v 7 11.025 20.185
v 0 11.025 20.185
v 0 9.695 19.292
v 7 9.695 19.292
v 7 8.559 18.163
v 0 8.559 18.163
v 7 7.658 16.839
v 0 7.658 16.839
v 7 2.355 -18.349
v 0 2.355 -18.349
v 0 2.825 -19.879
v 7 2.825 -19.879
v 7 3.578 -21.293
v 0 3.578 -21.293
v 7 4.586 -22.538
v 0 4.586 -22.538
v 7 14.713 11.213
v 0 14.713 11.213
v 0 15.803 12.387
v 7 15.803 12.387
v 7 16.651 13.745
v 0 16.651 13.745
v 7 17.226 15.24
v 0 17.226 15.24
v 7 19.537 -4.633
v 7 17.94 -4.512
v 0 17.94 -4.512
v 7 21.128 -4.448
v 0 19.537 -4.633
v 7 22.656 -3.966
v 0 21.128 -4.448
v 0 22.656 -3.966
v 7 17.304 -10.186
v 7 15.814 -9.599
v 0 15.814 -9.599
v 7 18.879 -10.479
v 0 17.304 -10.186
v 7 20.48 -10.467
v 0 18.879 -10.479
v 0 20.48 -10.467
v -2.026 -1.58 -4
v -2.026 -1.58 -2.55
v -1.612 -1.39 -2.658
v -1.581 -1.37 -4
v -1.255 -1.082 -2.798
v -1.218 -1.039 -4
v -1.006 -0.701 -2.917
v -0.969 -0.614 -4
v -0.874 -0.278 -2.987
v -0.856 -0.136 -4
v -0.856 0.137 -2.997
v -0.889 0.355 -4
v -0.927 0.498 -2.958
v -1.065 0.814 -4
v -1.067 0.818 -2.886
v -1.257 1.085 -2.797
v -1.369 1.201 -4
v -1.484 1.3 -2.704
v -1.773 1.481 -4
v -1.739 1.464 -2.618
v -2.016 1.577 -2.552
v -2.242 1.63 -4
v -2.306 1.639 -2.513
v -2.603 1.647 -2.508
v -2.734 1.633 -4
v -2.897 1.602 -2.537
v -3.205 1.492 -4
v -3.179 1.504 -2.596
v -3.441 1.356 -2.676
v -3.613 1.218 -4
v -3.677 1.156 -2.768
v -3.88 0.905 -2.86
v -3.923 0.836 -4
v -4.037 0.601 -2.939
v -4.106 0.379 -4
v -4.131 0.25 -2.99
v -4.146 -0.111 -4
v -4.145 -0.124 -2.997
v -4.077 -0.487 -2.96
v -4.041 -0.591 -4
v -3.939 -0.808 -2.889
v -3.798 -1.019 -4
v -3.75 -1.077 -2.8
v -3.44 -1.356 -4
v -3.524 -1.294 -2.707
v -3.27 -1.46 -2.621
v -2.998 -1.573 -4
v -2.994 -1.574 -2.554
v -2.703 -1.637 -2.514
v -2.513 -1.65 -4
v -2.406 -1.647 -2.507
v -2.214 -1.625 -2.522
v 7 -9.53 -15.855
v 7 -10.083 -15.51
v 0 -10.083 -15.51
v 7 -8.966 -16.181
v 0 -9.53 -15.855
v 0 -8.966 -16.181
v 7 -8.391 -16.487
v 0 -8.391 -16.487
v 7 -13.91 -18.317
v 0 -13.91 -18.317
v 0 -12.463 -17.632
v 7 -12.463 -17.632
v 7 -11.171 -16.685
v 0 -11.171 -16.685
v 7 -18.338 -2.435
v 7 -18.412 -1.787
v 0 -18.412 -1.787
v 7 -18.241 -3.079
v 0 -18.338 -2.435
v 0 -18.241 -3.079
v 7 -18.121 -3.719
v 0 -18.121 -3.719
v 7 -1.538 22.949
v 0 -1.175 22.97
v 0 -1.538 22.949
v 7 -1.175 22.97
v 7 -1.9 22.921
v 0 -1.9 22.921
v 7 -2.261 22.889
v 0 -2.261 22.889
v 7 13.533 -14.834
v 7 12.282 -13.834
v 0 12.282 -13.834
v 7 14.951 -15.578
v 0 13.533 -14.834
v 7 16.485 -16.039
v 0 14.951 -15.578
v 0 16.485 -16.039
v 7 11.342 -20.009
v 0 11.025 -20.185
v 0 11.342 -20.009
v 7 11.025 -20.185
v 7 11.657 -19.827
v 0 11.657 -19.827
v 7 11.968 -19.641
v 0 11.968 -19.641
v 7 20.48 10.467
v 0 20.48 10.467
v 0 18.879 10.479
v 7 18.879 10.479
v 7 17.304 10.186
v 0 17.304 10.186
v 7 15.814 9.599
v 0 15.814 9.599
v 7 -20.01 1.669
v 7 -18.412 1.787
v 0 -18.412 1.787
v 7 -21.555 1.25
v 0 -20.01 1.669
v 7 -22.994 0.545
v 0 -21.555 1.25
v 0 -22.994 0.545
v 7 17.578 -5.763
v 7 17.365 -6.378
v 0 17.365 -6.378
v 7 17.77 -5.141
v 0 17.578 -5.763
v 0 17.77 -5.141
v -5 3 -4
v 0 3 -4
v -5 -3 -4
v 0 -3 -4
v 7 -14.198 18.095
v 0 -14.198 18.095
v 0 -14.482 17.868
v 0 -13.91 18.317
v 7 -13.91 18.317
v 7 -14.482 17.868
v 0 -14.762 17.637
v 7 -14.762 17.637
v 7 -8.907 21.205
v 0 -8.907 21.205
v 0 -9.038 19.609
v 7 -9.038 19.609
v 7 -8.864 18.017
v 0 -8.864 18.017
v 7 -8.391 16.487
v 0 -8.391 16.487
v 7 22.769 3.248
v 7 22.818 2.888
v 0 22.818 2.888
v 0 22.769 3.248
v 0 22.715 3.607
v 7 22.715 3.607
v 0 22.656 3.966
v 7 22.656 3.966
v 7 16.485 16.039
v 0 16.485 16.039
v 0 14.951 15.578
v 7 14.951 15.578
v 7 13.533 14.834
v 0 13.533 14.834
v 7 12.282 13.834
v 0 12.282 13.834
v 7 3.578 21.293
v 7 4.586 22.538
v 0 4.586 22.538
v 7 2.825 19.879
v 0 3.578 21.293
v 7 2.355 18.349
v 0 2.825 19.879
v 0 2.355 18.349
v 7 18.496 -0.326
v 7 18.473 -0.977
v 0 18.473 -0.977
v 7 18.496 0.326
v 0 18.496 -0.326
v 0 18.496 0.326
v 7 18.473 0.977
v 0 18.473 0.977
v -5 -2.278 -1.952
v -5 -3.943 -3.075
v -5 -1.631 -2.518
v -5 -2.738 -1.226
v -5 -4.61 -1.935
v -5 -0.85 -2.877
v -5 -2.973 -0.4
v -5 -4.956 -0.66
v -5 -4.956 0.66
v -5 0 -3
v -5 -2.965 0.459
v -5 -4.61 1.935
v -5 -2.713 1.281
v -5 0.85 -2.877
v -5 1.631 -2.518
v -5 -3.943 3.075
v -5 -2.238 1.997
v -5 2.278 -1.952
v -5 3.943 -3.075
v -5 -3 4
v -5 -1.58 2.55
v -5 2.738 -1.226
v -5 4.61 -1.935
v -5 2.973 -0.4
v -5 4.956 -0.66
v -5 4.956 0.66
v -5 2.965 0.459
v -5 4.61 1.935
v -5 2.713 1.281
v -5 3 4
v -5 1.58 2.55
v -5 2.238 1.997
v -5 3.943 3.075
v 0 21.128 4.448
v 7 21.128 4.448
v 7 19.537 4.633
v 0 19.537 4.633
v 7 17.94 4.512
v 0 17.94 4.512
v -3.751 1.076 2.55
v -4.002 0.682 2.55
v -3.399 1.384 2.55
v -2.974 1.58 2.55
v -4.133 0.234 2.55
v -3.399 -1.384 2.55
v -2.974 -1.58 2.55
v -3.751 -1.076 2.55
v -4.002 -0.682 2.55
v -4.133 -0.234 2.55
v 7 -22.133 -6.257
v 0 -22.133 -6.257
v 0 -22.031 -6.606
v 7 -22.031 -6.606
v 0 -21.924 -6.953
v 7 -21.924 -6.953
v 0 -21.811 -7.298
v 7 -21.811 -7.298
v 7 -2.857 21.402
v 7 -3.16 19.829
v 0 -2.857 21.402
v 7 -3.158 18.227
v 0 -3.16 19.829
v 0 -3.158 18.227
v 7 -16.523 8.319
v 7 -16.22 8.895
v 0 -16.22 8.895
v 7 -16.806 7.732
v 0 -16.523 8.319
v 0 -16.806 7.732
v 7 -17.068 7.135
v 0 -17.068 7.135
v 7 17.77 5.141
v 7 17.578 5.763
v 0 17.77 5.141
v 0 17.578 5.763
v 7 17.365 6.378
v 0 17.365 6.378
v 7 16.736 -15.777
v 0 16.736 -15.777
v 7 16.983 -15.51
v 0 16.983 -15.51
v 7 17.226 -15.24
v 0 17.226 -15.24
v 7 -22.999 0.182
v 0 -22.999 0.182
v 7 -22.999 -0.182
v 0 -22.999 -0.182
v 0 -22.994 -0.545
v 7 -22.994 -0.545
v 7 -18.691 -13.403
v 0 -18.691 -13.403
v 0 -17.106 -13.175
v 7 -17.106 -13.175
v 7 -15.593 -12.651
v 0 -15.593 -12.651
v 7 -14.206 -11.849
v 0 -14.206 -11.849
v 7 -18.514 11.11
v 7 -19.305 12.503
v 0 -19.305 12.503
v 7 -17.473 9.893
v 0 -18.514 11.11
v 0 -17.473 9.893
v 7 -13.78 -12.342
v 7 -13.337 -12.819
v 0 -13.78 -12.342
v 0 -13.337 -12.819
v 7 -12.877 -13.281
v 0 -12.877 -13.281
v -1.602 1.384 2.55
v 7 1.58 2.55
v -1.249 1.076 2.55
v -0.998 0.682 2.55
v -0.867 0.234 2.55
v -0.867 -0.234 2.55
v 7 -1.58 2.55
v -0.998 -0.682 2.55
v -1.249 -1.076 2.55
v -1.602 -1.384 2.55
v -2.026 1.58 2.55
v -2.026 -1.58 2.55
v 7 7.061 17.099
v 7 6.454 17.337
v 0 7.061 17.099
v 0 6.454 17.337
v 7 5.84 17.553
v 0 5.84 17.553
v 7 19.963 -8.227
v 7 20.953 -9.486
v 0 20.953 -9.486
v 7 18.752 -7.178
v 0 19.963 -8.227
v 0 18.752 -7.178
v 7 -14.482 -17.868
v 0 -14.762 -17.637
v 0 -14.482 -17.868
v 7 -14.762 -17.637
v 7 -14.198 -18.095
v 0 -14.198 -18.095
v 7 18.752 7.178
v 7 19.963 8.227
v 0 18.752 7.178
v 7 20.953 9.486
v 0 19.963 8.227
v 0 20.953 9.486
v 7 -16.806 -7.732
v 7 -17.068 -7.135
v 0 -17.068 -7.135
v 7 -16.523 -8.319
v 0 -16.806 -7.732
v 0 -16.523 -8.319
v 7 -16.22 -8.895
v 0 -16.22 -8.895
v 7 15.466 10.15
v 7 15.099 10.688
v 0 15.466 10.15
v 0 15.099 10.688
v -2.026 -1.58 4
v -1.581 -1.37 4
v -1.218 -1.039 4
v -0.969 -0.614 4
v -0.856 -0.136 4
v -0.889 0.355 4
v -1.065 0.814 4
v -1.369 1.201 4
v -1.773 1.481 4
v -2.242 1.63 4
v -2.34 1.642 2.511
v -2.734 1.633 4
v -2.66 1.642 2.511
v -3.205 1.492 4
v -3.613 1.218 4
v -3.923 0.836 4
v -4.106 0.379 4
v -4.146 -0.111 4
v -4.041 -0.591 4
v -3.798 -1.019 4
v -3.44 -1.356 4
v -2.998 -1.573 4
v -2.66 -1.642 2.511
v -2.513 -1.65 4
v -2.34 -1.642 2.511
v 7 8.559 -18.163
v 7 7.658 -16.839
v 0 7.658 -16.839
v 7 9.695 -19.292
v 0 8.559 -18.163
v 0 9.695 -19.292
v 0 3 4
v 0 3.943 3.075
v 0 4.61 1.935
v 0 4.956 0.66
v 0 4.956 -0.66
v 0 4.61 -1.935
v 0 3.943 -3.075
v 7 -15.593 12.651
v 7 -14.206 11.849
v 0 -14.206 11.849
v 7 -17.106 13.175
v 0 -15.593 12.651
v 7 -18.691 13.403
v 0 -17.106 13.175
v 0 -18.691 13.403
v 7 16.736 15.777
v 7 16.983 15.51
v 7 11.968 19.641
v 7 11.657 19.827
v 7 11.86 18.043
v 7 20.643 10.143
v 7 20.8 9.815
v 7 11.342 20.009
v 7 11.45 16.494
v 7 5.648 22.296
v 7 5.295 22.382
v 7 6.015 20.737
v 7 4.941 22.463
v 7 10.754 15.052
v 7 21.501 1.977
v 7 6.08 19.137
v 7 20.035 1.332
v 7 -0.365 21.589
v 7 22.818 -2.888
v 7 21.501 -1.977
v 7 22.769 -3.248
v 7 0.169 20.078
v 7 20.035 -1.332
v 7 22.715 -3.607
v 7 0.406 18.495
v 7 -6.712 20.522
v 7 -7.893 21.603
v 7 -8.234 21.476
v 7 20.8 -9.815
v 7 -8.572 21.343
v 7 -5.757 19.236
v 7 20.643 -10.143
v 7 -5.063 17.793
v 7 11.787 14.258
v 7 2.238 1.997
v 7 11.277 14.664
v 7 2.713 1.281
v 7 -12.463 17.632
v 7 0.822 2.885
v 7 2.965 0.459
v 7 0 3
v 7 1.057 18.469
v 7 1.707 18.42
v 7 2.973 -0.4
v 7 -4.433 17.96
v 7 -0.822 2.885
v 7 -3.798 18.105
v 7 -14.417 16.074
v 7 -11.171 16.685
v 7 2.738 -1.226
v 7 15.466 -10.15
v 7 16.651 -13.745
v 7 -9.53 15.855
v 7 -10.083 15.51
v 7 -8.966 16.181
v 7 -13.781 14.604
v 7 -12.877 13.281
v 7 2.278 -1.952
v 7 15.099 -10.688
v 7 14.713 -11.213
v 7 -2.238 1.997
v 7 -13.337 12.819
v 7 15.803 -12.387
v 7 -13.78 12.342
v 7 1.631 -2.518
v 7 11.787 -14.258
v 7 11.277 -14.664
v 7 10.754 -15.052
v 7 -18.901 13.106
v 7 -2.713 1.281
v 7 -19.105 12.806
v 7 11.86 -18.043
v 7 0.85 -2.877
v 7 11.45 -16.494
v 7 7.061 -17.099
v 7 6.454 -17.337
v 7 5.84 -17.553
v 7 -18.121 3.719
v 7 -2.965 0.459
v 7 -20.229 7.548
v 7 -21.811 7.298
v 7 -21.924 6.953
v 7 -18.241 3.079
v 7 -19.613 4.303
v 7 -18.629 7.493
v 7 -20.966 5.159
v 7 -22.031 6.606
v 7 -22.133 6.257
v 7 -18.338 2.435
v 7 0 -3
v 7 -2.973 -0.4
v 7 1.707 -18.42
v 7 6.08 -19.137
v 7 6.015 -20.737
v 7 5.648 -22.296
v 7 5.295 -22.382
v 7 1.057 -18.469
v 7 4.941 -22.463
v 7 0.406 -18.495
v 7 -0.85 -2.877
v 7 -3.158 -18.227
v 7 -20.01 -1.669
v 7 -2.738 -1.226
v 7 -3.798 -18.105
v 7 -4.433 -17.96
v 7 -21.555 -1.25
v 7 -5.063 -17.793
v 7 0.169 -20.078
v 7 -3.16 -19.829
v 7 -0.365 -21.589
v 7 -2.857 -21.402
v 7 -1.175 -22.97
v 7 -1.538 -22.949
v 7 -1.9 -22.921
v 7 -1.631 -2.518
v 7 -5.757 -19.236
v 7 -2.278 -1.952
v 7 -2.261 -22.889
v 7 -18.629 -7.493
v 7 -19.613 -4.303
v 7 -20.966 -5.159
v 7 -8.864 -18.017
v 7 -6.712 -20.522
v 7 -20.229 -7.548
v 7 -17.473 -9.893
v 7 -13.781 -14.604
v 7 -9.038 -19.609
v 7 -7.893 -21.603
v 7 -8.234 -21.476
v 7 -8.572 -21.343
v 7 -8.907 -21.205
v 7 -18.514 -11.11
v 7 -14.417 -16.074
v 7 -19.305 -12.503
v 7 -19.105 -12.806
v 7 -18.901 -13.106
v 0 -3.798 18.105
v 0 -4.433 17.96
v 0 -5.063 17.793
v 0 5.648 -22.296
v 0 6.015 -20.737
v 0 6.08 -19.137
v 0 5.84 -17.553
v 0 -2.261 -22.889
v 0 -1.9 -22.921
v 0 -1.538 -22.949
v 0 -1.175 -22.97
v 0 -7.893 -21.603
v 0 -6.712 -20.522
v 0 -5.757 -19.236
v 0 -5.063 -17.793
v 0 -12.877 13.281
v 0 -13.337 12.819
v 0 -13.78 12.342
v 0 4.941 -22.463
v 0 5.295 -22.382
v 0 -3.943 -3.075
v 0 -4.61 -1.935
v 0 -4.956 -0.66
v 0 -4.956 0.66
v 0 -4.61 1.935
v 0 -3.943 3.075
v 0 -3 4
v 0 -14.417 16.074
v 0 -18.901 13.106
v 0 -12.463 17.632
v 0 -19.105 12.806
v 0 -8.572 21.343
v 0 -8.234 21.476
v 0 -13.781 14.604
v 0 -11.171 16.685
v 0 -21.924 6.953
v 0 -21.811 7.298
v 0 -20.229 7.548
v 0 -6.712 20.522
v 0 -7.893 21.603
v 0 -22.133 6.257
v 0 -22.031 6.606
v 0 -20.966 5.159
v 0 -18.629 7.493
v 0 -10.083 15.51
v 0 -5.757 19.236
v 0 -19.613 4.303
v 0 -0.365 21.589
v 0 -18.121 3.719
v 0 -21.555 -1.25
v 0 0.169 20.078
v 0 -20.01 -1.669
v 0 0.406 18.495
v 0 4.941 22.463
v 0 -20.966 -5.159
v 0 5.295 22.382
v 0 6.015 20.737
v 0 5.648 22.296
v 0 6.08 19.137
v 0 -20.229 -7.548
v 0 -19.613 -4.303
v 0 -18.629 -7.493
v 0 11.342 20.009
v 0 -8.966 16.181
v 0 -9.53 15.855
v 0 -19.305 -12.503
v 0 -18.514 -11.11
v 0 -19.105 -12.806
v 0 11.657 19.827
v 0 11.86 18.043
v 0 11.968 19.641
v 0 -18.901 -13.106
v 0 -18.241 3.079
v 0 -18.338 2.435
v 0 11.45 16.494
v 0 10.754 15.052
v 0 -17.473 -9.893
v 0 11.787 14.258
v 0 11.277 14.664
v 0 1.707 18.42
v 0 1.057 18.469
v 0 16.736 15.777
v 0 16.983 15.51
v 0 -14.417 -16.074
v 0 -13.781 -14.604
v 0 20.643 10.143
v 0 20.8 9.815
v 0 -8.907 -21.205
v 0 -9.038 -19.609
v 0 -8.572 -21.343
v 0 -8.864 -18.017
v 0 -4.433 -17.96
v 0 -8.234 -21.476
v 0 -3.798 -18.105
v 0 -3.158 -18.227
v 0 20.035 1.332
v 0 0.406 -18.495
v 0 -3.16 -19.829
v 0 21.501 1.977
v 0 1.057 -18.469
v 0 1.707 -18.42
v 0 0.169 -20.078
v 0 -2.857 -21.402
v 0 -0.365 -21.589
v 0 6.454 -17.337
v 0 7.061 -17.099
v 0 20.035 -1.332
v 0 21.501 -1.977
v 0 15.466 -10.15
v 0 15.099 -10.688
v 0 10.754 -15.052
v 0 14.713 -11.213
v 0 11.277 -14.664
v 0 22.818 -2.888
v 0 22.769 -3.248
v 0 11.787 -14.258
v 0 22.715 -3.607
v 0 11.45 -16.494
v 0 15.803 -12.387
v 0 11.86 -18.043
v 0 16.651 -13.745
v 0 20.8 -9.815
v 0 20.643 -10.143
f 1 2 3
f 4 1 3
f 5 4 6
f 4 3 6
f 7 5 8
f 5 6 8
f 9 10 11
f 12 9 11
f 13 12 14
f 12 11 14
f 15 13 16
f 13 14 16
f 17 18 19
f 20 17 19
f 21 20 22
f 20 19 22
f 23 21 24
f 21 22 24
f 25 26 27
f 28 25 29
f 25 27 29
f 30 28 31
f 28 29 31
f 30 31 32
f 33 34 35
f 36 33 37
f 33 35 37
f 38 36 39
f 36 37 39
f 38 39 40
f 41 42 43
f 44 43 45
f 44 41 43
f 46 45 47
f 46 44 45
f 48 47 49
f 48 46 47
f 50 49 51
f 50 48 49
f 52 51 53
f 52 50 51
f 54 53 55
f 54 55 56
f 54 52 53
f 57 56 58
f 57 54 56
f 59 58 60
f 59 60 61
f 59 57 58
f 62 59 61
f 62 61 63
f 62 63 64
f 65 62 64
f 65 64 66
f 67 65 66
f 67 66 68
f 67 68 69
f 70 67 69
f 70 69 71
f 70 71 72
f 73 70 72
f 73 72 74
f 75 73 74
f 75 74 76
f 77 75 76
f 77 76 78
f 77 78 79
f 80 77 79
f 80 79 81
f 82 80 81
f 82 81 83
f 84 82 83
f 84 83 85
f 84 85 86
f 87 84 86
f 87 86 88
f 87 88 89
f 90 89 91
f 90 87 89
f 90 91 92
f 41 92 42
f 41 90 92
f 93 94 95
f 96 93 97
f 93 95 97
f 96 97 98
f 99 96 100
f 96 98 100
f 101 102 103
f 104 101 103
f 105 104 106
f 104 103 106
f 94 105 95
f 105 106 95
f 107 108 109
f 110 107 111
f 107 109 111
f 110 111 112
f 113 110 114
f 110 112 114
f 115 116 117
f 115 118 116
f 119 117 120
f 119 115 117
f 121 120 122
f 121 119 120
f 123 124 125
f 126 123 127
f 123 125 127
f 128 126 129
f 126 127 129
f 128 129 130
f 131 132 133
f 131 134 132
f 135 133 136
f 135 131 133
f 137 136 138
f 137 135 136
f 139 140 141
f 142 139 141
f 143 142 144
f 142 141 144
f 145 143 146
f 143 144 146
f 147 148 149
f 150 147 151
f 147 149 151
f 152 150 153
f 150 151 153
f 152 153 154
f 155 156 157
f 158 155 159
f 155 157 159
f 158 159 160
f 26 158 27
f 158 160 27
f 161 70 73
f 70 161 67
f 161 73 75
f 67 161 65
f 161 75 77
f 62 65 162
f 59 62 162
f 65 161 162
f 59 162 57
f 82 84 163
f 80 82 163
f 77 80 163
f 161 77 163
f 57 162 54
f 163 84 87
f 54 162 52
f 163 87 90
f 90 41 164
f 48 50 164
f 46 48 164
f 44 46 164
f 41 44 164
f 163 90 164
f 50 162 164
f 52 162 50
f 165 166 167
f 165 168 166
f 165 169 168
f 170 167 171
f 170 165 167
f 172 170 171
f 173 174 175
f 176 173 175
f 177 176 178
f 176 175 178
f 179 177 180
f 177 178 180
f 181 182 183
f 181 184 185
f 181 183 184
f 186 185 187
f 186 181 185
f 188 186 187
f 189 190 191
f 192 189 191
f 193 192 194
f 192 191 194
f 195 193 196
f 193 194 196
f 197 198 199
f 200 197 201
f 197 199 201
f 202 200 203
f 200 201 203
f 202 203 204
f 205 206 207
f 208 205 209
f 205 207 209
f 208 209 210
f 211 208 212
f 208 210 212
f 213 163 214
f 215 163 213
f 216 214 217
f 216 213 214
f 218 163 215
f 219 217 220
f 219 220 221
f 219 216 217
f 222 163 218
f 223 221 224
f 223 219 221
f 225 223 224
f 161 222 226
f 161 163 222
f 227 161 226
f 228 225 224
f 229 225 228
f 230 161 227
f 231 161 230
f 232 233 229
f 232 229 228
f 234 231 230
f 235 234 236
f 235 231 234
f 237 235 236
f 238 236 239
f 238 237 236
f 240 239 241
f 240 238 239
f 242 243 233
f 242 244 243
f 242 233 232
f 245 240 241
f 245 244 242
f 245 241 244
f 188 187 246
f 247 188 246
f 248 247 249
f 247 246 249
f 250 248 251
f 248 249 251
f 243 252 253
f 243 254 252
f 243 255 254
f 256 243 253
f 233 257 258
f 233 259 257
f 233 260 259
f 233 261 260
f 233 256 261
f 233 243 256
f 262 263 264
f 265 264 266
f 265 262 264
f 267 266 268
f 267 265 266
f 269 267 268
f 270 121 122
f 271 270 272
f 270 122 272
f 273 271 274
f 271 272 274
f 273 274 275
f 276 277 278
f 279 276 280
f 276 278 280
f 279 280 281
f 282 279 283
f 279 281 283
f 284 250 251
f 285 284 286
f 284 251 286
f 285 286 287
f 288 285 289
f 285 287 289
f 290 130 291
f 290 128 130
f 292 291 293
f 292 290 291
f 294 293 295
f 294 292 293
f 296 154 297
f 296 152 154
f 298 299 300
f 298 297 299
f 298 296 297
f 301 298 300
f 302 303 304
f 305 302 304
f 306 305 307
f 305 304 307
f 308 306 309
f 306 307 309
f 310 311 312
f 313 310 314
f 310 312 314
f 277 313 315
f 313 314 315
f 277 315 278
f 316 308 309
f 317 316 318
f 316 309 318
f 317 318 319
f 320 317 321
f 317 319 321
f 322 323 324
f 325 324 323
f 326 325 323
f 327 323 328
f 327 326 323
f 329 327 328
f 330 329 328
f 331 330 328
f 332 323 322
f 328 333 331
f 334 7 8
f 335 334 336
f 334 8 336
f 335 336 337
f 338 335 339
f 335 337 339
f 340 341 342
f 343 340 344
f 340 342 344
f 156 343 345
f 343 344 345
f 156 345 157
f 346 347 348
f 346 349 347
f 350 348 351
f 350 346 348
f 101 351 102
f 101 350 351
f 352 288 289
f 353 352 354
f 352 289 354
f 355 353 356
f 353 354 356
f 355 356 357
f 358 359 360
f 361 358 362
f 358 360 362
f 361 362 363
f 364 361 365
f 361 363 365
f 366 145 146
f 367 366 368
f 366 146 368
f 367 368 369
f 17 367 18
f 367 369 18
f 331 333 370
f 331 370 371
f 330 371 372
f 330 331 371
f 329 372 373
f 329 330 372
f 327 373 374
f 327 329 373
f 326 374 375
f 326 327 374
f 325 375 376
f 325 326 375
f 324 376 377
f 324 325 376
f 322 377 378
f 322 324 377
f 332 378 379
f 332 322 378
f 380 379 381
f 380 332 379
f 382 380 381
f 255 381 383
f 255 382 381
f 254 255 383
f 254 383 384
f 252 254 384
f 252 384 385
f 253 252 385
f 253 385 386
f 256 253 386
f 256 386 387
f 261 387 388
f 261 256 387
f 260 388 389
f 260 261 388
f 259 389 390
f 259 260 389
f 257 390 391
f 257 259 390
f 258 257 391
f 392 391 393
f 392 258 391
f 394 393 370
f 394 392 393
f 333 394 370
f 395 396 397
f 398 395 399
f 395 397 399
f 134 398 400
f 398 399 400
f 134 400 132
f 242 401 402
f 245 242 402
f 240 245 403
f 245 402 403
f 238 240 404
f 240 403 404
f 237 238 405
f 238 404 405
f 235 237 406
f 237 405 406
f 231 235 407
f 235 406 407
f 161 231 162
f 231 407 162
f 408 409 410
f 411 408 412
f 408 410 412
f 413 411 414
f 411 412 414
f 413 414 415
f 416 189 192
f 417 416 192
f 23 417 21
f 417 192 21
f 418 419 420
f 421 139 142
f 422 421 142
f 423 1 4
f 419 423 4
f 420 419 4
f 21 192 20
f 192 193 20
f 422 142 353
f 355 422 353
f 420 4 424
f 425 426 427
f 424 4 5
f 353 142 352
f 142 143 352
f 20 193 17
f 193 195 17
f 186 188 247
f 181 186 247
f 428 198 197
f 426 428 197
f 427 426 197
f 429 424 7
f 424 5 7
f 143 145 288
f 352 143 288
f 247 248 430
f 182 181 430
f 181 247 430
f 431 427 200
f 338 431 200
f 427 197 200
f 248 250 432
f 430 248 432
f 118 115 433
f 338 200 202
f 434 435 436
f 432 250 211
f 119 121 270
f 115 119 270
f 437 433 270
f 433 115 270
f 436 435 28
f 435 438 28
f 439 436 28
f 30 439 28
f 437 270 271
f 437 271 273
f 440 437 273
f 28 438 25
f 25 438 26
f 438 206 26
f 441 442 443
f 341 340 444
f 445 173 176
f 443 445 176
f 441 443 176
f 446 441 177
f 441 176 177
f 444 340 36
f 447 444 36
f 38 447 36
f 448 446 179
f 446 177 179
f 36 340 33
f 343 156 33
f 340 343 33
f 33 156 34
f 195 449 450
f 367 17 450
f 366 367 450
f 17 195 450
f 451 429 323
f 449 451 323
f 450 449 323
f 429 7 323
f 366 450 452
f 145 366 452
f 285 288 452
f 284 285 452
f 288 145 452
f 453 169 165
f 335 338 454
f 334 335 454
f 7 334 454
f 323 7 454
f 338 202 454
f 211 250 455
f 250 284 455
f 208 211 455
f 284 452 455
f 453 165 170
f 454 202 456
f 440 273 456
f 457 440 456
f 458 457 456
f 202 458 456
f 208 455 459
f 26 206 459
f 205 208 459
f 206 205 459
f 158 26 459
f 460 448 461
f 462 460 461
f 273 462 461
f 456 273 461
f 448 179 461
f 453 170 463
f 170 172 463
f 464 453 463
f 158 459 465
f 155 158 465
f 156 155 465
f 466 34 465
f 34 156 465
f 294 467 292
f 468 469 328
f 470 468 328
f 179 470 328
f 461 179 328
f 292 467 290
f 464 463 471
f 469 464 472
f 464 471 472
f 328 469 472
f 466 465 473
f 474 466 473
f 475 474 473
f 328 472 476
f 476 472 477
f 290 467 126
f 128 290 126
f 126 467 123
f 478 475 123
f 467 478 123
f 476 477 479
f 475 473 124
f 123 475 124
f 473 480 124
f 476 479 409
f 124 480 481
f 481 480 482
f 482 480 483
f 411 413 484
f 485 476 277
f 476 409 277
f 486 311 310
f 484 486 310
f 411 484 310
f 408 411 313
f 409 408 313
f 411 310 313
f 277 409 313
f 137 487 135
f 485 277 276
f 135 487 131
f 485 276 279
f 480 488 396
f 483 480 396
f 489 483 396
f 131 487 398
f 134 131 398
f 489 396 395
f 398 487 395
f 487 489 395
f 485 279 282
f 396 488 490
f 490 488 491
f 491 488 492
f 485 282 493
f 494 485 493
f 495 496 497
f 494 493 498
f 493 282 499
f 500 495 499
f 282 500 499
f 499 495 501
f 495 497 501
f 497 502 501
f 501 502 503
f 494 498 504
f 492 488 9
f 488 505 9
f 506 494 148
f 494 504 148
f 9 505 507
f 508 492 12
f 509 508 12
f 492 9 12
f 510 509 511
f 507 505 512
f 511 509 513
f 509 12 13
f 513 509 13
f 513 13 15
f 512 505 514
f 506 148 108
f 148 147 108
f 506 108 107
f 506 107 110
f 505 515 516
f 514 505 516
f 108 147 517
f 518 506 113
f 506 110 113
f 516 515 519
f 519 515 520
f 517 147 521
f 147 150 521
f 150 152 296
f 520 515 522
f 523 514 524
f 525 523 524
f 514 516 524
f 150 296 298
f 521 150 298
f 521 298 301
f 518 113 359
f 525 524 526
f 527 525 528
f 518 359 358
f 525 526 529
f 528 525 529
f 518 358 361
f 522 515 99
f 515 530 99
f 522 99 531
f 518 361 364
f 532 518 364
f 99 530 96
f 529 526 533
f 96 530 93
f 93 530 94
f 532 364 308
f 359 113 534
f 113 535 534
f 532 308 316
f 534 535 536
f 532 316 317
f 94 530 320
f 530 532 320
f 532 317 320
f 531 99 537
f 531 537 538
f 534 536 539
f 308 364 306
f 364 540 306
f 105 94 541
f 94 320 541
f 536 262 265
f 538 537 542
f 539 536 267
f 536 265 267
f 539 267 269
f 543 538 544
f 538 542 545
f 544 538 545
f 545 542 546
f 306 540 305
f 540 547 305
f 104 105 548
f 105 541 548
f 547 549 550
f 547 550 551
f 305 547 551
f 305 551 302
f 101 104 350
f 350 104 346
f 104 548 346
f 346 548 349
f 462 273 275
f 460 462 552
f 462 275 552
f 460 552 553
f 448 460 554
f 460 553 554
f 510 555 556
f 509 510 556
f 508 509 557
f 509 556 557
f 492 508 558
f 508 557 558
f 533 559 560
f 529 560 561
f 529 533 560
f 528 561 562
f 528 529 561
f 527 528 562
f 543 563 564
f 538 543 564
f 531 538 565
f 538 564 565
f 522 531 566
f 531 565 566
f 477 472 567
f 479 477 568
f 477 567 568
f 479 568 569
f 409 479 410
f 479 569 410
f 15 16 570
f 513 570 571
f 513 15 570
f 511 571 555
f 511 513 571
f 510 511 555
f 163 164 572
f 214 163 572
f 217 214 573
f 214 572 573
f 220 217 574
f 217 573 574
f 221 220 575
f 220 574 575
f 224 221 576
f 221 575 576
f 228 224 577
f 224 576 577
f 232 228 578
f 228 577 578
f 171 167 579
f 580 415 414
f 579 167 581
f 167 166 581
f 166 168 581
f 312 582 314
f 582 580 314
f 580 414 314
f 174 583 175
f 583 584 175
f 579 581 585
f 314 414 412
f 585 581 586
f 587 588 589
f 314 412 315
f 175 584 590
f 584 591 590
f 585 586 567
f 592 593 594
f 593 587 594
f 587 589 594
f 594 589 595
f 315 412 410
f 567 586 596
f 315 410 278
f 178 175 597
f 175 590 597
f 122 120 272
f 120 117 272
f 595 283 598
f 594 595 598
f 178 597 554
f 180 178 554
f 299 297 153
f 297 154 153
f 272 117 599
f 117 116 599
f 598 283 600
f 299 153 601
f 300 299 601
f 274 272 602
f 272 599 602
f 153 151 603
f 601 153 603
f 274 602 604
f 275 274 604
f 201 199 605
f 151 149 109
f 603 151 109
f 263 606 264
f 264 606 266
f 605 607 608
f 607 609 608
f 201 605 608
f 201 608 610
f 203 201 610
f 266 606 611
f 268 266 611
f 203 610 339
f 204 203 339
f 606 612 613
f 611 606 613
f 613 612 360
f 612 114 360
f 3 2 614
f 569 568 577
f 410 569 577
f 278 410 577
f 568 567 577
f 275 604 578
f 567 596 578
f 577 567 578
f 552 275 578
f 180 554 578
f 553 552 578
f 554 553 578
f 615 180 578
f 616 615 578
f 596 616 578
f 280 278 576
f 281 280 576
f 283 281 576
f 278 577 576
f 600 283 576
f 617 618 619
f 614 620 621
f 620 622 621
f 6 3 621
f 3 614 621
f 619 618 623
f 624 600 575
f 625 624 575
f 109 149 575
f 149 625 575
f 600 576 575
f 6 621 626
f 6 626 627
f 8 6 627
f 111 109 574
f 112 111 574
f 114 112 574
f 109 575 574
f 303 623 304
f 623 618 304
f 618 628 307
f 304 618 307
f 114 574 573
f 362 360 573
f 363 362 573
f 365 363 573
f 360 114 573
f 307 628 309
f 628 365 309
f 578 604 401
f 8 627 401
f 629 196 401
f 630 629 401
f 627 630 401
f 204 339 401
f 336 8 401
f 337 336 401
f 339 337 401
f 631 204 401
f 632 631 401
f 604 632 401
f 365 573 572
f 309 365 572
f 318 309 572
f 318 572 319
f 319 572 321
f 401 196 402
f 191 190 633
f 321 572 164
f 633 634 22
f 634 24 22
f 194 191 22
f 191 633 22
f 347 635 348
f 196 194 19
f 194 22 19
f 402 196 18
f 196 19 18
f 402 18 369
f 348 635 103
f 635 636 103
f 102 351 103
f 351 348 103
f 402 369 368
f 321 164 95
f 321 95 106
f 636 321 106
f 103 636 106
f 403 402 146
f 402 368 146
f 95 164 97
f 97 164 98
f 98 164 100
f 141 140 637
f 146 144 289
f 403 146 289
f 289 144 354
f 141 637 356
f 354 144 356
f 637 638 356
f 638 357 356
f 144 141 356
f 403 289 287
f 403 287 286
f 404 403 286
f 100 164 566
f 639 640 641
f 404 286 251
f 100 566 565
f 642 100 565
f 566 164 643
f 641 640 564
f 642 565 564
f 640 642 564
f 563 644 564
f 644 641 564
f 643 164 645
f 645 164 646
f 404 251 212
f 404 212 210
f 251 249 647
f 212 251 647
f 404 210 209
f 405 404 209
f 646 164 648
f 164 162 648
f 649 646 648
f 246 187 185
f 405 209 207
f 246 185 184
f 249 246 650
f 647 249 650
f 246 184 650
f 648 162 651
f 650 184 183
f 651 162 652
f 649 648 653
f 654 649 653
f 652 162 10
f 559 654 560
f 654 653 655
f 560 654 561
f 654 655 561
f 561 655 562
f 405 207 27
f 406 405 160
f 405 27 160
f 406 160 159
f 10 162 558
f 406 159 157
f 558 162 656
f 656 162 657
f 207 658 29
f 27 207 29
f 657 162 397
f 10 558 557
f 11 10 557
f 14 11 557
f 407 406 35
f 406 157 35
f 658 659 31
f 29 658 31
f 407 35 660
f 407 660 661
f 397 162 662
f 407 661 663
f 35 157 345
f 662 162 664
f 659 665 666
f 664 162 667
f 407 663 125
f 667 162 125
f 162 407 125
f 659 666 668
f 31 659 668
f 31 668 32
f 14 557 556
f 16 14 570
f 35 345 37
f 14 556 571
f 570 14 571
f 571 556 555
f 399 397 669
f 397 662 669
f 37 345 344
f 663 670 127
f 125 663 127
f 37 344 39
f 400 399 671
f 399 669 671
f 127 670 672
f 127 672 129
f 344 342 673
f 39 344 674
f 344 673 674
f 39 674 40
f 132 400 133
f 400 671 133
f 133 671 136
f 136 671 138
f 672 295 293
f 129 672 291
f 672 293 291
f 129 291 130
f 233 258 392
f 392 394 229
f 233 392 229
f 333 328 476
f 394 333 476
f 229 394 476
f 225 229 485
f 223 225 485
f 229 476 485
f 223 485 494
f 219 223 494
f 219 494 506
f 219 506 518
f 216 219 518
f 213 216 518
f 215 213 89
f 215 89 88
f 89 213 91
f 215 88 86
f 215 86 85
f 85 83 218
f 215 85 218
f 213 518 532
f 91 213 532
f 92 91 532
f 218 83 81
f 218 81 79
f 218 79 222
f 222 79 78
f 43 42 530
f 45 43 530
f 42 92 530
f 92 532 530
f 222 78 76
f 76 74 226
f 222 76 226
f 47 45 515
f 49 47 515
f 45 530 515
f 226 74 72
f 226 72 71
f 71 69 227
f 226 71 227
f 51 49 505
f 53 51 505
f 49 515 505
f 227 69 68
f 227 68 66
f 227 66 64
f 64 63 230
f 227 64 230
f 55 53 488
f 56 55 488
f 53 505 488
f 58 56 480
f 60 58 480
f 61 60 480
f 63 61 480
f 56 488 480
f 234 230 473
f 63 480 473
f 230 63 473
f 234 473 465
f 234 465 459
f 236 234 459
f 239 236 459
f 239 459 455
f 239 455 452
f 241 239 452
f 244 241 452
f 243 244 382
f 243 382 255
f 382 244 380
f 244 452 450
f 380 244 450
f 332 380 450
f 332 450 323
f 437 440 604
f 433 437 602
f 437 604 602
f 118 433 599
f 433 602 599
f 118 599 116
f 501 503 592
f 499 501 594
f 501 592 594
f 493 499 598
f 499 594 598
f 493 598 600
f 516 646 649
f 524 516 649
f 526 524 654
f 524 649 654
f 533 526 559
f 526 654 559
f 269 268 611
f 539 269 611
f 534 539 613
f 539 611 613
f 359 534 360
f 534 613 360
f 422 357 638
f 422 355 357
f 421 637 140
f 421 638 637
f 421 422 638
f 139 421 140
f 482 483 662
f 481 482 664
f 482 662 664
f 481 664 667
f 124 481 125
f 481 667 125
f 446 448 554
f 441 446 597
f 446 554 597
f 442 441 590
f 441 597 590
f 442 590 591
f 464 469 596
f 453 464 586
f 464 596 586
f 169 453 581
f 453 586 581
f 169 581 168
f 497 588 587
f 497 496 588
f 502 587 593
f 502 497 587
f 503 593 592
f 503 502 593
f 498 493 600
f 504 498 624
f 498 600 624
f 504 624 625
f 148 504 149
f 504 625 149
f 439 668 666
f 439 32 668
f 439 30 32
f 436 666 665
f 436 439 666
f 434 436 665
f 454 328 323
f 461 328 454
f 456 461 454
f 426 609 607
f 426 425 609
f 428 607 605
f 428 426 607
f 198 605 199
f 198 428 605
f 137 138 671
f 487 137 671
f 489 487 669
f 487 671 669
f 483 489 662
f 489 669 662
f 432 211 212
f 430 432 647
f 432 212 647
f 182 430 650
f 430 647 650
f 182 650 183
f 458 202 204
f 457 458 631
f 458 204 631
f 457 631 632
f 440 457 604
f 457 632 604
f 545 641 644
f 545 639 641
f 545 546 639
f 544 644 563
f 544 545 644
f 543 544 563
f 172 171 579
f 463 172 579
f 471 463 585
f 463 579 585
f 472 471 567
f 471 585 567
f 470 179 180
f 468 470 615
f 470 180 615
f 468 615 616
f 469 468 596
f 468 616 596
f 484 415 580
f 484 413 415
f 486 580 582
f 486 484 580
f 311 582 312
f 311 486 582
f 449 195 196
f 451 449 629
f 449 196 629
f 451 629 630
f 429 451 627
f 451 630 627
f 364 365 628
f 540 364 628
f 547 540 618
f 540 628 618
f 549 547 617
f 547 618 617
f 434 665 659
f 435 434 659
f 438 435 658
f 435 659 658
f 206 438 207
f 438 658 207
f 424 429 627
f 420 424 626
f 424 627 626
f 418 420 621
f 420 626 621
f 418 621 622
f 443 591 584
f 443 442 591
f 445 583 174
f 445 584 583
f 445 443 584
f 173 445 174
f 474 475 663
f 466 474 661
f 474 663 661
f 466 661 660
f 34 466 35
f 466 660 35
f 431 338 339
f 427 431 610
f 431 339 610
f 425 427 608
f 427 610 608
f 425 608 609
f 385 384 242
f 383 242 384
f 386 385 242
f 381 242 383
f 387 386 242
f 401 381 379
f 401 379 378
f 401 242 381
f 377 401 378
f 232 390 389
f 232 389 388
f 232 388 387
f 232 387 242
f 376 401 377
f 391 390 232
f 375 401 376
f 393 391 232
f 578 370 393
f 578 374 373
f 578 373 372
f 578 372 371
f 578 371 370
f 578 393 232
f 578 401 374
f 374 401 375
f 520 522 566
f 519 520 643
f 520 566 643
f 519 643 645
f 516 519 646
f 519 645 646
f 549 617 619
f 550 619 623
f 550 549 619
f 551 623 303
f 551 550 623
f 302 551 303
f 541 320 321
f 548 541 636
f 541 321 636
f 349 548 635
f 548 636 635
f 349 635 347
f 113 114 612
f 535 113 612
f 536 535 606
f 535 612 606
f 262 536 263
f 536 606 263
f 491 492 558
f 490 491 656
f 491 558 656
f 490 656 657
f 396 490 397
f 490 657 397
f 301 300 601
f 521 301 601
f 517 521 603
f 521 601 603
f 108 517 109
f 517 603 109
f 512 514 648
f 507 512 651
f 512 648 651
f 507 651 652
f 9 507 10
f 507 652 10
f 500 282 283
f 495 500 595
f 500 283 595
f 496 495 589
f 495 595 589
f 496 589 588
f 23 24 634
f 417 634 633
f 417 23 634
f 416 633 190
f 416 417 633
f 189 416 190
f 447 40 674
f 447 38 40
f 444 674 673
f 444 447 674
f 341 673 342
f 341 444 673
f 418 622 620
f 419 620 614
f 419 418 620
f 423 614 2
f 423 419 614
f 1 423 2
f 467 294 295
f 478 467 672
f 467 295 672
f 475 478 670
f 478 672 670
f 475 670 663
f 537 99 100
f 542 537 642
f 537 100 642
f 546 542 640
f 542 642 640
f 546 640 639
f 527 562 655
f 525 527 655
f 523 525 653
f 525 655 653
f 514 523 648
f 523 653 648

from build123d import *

# Parameters (mm, degrees)
BASPROSKE_W              = 7
BASPROSKE_H              = 23
TOOTHCUT_DEPTH           = 34.271609519
TEETHCUTS_COUNT          = 21
TEETHCUTS_ANGLE          = 342.857142857
HUBNEAONESKE_R           = 5
HUBNEARONE_DEPTH         = 5.0000508
BORSKE_R                 = 3
BORE_DEPTH               = 12.0000508
EXTRUDE_1_DEPTH          = 12.000051
CUT_EXTRUDE_START        = -5.0000508
CUT_EXTRUDE_2_DEPTH      = 5.0000508
CUT_EXTRUDE_3_DEPTH      = 34.250848963
CUT_EXTRUDE_3_DEPTH_BACK = 34.250848963
SKETCH_3_R               = 1.65


with BuildPart() as part:
    # BasProSke → Base-Revolve (revolve)
    with BuildSketch(Plane(origin=(0, 0, 0), x_dir=(1, 0, 0), z_dir=(0, 1, 0)), mode=Mode.PRIVATE) as base_revolve_sk:
        with Locations((3.5, 11.5)):
            Rectangle(BASPROSKE_W, BASPROSKE_H)
    revolve(base_revolve_sk.sketch.rotate(Axis((-10, 0, 0), (1, 0, 0)), 180), axis=Axis((-10, 0, 0), (1, 0, 0)))

    # TooCutSke → ToothCut (cut, through all)
    with BuildSketch(Plane(origin=(0, 0, 0), x_dir=(0, 0, -1), z_dir=(1, 0, 0))):
        with BuildLine():
            ThreePointArc((0.976779145, 18.473194188), (0, 18.499), (-0.976779145, 18.473194188))
            ThreePointArc((-0.976779145, 18.473194188), (-1.625451341, 20.797249275), (-2.90802115, 22.841025768))
            ThreePointArc((-2.90802115, 22.841025768), (0, 23.0254), (2.90802115, 22.841025768))
            ThreePointArc((2.90802115, 22.841025768), (1.625451341, 20.797249275), (0.976779145, 18.473194188))
        make_face()
    toothcut = extrude(amount=TOOTHCUT_DEPTH, mode=Mode.SUBTRACT)

    # TeethCuts: ToothCut ×21 about axis
    teethcuts_axis = Axis((-10, 0, 0), (1, 0, 0))
    for i in range(1, TEETHCUTS_COUNT):
        add(toothcut.rotate(teethcuts_axis, i * TEETHCUTS_ANGLE / (TEETHCUTS_COUNT - 1)), mode=Mode.SUBTRACT)

    # HubNeaOneSke → HubNearOne (add)
    with BuildSketch(Plane.ZY):
        with Locations(Location((0, 0, 0), (0, 0, 180))):
            Circle(HUBNEAONESKE_R)
    extrude(amount=HUBNEARONE_DEPTH)

    # BorSke → Bore (cut, symmetric)
    with BuildSketch(Plane(origin=(0, 0, 0), x_dir=(0, 0, -1), z_dir=(1, 0, 0))):
        with Locations(Location((0, 0, 0), (0, 0, 180))):
            Circle(BORSKE_R)
    extrude(amount=BORE_DEPTH, both=True, mode=Mode.SUBTRACT)

    # 草图1 → 凸台-拉伸1 (add, through all)
    with BuildSketch(Plane.ZY.offset(5.0000508)):
        with BuildLine():
            Line((2.55, 1.580348063), (2.55, -1.580348063))
            ThreePointArc((2.55, -1.580348063), (3, 0), (2.55, 1.580348063))
        make_face()
    extrude(amount=-EXTRUDE_1_DEPTH)

    # 草图4 → 切除-拉伸2 (cut)
    with BuildSketch(Plane.ZY.offset(5.0000508).offset(CUT_EXTRUDE_START)):
        with BuildLine():
            Line((-4, 3), (-4, -3))
            ThreePointArc((-4, -3), (-5, 0), (-4, 3))
        make_face()
        with BuildLine():
            Line((4, 3), (4, -3))
            ThreePointArc((4, -3), (5, 0), (4, 3))
        make_face()
    extrude(amount=CUT_EXTRUDE_2_DEPTH, mode=Mode.SUBTRACT)

    # 草图3 → 切除-拉伸3 (cut, two sides: drawn at the far end of the back side and taken through both)
    with BuildSketch(Plane.XY.offset(-CUT_EXTRUDE_3_DEPTH_BACK)):
        with Locations(Location((-2.5000508, 0, 0), (0, 0, 286.707134567))):
            Circle(SKETCH_3_R)
    extrude(amount=CUT_EXTRUDE_3_DEPTH + CUT_EXTRUDE_3_DEPTH_BACK, mode=Mode.SUBTRACT)


solid = part.part
